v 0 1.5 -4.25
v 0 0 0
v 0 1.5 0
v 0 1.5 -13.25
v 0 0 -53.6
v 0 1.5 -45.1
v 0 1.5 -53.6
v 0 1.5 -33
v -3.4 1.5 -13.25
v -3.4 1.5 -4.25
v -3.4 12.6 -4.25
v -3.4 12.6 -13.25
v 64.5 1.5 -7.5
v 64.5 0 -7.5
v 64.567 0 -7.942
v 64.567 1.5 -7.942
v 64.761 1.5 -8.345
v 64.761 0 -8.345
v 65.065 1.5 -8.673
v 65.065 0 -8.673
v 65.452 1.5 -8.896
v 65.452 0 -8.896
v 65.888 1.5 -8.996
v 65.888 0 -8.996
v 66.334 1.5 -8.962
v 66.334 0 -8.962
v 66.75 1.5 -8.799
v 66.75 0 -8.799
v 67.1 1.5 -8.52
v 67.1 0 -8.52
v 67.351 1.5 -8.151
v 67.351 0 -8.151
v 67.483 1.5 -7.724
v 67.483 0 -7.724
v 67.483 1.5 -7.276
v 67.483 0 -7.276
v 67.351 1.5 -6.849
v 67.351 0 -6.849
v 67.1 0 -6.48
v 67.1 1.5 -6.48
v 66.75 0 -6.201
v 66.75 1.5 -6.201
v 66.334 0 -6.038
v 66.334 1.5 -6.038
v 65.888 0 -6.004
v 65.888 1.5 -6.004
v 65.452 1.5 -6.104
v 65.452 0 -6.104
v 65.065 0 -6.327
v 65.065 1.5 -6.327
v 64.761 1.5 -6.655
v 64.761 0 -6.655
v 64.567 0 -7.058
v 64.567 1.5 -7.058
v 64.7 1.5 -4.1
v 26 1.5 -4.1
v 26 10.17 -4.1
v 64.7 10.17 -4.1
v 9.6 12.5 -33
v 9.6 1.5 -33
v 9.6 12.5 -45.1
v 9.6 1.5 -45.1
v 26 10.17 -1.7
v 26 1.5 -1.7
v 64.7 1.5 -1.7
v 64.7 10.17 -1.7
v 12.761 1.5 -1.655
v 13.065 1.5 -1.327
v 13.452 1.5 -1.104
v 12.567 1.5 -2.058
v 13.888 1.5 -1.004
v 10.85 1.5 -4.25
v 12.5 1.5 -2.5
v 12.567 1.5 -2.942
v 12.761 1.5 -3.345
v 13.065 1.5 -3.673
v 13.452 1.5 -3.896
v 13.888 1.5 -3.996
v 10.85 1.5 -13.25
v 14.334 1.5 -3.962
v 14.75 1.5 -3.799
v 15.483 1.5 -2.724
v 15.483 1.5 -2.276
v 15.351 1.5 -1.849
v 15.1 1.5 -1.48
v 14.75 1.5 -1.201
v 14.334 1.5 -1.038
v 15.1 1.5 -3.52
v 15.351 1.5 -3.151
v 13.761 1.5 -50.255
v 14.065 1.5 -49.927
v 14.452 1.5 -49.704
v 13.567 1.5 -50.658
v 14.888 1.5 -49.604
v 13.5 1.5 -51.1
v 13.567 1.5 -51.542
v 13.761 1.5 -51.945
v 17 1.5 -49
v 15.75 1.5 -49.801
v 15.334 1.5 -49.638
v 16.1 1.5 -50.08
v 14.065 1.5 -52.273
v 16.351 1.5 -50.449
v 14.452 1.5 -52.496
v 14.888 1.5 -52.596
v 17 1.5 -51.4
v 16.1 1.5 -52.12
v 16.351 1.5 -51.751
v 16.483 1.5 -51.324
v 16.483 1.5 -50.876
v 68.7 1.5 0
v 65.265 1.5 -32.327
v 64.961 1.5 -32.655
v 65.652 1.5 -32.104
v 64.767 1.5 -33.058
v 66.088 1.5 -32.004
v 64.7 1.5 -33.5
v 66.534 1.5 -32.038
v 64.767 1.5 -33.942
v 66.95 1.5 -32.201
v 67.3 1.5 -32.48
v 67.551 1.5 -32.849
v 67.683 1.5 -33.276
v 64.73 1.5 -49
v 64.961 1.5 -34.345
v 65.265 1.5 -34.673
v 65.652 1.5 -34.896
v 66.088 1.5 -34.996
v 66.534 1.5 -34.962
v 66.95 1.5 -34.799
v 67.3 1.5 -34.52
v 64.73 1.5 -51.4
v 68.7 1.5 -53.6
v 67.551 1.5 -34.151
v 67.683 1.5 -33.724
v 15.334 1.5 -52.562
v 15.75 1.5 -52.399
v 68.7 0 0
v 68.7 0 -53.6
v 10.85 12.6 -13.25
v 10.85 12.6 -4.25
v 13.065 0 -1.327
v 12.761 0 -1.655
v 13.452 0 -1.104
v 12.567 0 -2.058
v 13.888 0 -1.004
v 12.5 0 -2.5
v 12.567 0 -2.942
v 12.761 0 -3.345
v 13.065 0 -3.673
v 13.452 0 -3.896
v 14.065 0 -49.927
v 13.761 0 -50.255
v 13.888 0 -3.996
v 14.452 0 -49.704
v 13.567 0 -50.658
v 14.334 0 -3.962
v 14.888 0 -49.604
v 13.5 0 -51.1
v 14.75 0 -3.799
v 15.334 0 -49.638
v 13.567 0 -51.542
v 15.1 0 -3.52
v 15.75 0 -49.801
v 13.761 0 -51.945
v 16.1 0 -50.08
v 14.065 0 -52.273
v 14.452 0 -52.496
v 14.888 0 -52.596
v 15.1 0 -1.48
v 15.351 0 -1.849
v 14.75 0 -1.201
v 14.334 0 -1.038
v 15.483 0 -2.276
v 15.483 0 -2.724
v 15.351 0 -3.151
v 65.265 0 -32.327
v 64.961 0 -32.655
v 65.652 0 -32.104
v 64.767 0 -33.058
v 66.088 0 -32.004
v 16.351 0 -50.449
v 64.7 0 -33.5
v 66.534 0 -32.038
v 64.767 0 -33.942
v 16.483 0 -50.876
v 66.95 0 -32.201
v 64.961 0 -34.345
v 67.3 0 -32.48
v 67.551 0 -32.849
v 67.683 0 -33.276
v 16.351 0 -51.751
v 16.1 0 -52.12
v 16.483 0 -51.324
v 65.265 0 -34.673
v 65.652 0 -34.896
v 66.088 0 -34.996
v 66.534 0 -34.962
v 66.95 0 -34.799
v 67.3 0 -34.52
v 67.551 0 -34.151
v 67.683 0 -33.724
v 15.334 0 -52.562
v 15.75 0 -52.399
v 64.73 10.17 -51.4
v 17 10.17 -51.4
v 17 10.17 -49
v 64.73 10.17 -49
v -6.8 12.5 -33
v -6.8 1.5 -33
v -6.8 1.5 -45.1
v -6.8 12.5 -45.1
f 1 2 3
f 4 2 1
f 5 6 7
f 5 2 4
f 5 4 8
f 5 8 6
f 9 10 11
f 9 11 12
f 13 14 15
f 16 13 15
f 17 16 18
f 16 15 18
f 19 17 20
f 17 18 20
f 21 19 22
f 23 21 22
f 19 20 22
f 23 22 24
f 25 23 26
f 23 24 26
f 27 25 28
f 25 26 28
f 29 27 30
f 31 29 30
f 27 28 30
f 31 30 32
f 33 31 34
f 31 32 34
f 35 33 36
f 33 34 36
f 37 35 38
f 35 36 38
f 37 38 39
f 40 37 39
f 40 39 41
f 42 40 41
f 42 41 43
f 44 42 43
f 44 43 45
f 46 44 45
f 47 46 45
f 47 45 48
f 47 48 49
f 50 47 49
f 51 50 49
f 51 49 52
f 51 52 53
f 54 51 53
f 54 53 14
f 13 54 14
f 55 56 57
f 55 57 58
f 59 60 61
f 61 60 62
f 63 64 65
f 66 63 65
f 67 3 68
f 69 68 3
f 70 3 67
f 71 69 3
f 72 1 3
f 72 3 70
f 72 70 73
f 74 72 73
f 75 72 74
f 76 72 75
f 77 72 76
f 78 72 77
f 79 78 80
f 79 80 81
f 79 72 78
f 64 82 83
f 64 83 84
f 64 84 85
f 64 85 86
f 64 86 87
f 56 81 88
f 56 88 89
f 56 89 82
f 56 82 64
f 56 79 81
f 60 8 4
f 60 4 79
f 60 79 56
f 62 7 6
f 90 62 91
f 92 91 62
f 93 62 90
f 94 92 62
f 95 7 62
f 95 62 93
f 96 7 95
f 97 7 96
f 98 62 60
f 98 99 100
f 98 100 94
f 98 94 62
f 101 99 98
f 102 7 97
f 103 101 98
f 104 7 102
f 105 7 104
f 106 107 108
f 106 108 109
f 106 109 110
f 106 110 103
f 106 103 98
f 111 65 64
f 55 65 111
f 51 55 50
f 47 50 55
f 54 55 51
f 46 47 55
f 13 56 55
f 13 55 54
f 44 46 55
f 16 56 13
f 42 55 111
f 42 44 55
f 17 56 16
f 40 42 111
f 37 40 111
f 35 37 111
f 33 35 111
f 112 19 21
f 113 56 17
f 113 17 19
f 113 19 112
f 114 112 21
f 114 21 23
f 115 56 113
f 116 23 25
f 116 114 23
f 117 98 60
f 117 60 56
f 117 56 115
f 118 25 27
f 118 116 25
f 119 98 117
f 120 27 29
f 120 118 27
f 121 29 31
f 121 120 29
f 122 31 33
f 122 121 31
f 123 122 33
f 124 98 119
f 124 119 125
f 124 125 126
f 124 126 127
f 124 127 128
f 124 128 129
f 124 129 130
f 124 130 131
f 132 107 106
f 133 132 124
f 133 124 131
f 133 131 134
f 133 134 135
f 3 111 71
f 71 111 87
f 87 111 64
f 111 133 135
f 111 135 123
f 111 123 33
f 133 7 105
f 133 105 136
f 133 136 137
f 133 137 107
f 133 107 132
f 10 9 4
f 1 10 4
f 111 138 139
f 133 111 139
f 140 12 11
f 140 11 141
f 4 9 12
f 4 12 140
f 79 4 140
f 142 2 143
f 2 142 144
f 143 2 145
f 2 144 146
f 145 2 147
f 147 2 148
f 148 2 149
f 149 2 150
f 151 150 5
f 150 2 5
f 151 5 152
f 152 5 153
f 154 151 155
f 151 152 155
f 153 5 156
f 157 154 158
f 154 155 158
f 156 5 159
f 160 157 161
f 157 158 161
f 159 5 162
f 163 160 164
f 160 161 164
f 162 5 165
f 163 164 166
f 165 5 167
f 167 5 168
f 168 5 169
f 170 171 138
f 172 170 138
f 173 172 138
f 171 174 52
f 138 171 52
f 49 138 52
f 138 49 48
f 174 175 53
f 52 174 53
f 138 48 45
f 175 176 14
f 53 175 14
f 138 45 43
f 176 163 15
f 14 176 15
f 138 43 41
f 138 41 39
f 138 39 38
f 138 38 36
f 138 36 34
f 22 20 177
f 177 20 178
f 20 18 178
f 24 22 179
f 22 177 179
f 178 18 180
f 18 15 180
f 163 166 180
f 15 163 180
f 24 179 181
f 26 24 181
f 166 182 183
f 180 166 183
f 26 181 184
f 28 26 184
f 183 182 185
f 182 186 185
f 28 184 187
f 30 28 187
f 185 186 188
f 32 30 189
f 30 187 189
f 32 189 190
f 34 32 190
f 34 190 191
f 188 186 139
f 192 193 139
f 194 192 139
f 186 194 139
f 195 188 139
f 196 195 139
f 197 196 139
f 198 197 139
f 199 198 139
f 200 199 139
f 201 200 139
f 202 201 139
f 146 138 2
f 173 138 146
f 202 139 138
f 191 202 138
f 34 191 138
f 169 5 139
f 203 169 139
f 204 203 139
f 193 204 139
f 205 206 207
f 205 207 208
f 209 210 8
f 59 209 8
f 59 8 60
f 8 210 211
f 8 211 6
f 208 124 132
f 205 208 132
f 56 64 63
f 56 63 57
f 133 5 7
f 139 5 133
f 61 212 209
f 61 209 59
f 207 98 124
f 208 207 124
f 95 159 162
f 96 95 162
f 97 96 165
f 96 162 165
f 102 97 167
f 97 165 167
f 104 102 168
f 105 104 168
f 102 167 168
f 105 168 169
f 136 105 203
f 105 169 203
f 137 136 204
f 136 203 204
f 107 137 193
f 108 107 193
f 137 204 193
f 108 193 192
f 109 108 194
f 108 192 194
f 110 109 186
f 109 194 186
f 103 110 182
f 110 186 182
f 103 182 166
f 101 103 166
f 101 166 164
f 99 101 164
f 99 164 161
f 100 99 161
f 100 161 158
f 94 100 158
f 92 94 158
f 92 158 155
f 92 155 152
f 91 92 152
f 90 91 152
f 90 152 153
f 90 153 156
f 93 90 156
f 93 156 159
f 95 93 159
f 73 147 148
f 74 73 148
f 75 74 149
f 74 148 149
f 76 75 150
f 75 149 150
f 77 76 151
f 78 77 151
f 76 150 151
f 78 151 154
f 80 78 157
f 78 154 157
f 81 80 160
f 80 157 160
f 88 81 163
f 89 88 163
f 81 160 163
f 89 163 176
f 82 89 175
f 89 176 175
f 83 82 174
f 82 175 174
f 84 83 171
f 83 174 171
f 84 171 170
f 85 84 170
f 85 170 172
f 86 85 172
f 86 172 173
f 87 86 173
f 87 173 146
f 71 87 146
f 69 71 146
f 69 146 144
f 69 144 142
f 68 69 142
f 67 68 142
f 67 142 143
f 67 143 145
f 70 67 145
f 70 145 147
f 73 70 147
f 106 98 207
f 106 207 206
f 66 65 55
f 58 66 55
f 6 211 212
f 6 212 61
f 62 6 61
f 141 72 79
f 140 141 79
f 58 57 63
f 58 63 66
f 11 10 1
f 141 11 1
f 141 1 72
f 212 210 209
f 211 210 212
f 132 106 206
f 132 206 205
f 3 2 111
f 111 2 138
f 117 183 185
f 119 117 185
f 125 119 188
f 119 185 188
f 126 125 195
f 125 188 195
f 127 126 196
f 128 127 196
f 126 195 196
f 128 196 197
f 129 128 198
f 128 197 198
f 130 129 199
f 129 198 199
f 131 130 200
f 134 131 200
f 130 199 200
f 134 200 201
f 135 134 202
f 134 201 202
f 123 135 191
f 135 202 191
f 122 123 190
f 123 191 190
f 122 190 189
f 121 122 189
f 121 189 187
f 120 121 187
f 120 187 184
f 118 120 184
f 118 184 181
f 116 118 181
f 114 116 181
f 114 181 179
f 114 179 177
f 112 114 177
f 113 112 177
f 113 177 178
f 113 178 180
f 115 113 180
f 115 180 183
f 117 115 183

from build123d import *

# Parameters (mm, degrees)
SKETCH2_W                 = 68.7
SKETCH2_H                 = 53.6
PCB_DEPTH                 = 1.5
BARREL_START              = 1.5
SKETCH3_W                 = 14.25
SKETCH3_H                 = 9
BARREL_JACK_DEPTH         = 11.1
HWSERIAL_START            = 1.5
SKETCH4_W                 = 16.4
SKETCH4_H                 = 12.1
HWSERIAL_PORT_DEPTH       = 11
BOSS_EXTRUDE4_START       = 1.5
SKETCH5_W                 = 47.73
SKETCH5_H                 = 2.4
SKETCH5_W_2               = 38.7
BOSS_EXTRUDE4_DEPTH       = 8.67
F_3_0MM_DOWEL_HOLE1_D     = 3
F_3_0MM_DOWEL_HOLE1_DEPTH = 7.5
F_3_0MM_DOWEL_HOLE1_TIP   = 0.901290929


with BuildPart() as part:
    # Sketch2 → PCB (new body)
    with BuildSketch(Plane(origin=(0, 0, 0), x_dir=(1, 0, 0), z_dir=(0, 1, 0))):
        with Locations((34.35, 26.8)):
            Rectangle(SKETCH2_W, SKETCH2_H)
    extrude(amount=PCB_DEPTH)

    # Sketch3 → Barrel Jack (add)
    with BuildSketch(Plane(origin=(0, 0, 0), x_dir=(1, 0, 0), z_dir=(0, 1, 0)).offset(BARREL_START)):
        with Locations((3.725, 8.75)):
            Rectangle(SKETCH3_W, SKETCH3_H)
    extrude(amount=BARREL_JACK_DEPTH)

    # Sketch4 → HWSerial Port (add)
    with BuildSketch(Plane(origin=(0, 0, 0), x_dir=(1, 0, 0), z_dir=(0, 1, 0)).offset(HWSERIAL_START)):
        with Locations((1.4, 39.05)):
            Rectangle(SKETCH4_W, SKETCH4_H)
    extrude(amount=HWSERIAL_PORT_DEPTH)

    # Sketch5 → Boss-Extrude4 (add)
    with BuildSketch(Plane(origin=(0, 0, 0), x_dir=(1, 0, 0), z_dir=(0, 1, 0)).offset(BOSS_EXTRUDE4_START)):
        with Locations((40.865, 50.2)):
            Rectangle(SKETCH5_W, SKETCH5_H)
        with Locations((45.35, 2.9)):
            Rectangle(SKETCH5_W_2, SKETCH5_H)
    extrude(amount=BOSS_EXTRUDE4_DEPTH)

    # Ø3.0mm Dowel Hole1
    with Locations(Plane(origin=(0, 1.5, 0), x_dir=(1, 0, 0), z_dir=(0, 1, 0))):
        with Locations((15, 51.1), (14, 2.5), (66, 7.5), (66.2, 33.5)):
            Hole(F_3_0MM_DOWEL_HOLE1_D / 2, depth=F_3_0MM_DOWEL_HOLE1_DEPTH)
            with Locations((0, 0, -(F_3_0MM_DOWEL_HOLE1_DEPTH + F_3_0MM_DOWEL_HOLE1_TIP / 2))):  # 118° drill point
                Cone(0, F_3_0MM_DOWEL_HOLE1_D / 2, F_3_0MM_DOWEL_HOLE1_TIP, mode=Mode.SUBTRACT)


solid = part.part
